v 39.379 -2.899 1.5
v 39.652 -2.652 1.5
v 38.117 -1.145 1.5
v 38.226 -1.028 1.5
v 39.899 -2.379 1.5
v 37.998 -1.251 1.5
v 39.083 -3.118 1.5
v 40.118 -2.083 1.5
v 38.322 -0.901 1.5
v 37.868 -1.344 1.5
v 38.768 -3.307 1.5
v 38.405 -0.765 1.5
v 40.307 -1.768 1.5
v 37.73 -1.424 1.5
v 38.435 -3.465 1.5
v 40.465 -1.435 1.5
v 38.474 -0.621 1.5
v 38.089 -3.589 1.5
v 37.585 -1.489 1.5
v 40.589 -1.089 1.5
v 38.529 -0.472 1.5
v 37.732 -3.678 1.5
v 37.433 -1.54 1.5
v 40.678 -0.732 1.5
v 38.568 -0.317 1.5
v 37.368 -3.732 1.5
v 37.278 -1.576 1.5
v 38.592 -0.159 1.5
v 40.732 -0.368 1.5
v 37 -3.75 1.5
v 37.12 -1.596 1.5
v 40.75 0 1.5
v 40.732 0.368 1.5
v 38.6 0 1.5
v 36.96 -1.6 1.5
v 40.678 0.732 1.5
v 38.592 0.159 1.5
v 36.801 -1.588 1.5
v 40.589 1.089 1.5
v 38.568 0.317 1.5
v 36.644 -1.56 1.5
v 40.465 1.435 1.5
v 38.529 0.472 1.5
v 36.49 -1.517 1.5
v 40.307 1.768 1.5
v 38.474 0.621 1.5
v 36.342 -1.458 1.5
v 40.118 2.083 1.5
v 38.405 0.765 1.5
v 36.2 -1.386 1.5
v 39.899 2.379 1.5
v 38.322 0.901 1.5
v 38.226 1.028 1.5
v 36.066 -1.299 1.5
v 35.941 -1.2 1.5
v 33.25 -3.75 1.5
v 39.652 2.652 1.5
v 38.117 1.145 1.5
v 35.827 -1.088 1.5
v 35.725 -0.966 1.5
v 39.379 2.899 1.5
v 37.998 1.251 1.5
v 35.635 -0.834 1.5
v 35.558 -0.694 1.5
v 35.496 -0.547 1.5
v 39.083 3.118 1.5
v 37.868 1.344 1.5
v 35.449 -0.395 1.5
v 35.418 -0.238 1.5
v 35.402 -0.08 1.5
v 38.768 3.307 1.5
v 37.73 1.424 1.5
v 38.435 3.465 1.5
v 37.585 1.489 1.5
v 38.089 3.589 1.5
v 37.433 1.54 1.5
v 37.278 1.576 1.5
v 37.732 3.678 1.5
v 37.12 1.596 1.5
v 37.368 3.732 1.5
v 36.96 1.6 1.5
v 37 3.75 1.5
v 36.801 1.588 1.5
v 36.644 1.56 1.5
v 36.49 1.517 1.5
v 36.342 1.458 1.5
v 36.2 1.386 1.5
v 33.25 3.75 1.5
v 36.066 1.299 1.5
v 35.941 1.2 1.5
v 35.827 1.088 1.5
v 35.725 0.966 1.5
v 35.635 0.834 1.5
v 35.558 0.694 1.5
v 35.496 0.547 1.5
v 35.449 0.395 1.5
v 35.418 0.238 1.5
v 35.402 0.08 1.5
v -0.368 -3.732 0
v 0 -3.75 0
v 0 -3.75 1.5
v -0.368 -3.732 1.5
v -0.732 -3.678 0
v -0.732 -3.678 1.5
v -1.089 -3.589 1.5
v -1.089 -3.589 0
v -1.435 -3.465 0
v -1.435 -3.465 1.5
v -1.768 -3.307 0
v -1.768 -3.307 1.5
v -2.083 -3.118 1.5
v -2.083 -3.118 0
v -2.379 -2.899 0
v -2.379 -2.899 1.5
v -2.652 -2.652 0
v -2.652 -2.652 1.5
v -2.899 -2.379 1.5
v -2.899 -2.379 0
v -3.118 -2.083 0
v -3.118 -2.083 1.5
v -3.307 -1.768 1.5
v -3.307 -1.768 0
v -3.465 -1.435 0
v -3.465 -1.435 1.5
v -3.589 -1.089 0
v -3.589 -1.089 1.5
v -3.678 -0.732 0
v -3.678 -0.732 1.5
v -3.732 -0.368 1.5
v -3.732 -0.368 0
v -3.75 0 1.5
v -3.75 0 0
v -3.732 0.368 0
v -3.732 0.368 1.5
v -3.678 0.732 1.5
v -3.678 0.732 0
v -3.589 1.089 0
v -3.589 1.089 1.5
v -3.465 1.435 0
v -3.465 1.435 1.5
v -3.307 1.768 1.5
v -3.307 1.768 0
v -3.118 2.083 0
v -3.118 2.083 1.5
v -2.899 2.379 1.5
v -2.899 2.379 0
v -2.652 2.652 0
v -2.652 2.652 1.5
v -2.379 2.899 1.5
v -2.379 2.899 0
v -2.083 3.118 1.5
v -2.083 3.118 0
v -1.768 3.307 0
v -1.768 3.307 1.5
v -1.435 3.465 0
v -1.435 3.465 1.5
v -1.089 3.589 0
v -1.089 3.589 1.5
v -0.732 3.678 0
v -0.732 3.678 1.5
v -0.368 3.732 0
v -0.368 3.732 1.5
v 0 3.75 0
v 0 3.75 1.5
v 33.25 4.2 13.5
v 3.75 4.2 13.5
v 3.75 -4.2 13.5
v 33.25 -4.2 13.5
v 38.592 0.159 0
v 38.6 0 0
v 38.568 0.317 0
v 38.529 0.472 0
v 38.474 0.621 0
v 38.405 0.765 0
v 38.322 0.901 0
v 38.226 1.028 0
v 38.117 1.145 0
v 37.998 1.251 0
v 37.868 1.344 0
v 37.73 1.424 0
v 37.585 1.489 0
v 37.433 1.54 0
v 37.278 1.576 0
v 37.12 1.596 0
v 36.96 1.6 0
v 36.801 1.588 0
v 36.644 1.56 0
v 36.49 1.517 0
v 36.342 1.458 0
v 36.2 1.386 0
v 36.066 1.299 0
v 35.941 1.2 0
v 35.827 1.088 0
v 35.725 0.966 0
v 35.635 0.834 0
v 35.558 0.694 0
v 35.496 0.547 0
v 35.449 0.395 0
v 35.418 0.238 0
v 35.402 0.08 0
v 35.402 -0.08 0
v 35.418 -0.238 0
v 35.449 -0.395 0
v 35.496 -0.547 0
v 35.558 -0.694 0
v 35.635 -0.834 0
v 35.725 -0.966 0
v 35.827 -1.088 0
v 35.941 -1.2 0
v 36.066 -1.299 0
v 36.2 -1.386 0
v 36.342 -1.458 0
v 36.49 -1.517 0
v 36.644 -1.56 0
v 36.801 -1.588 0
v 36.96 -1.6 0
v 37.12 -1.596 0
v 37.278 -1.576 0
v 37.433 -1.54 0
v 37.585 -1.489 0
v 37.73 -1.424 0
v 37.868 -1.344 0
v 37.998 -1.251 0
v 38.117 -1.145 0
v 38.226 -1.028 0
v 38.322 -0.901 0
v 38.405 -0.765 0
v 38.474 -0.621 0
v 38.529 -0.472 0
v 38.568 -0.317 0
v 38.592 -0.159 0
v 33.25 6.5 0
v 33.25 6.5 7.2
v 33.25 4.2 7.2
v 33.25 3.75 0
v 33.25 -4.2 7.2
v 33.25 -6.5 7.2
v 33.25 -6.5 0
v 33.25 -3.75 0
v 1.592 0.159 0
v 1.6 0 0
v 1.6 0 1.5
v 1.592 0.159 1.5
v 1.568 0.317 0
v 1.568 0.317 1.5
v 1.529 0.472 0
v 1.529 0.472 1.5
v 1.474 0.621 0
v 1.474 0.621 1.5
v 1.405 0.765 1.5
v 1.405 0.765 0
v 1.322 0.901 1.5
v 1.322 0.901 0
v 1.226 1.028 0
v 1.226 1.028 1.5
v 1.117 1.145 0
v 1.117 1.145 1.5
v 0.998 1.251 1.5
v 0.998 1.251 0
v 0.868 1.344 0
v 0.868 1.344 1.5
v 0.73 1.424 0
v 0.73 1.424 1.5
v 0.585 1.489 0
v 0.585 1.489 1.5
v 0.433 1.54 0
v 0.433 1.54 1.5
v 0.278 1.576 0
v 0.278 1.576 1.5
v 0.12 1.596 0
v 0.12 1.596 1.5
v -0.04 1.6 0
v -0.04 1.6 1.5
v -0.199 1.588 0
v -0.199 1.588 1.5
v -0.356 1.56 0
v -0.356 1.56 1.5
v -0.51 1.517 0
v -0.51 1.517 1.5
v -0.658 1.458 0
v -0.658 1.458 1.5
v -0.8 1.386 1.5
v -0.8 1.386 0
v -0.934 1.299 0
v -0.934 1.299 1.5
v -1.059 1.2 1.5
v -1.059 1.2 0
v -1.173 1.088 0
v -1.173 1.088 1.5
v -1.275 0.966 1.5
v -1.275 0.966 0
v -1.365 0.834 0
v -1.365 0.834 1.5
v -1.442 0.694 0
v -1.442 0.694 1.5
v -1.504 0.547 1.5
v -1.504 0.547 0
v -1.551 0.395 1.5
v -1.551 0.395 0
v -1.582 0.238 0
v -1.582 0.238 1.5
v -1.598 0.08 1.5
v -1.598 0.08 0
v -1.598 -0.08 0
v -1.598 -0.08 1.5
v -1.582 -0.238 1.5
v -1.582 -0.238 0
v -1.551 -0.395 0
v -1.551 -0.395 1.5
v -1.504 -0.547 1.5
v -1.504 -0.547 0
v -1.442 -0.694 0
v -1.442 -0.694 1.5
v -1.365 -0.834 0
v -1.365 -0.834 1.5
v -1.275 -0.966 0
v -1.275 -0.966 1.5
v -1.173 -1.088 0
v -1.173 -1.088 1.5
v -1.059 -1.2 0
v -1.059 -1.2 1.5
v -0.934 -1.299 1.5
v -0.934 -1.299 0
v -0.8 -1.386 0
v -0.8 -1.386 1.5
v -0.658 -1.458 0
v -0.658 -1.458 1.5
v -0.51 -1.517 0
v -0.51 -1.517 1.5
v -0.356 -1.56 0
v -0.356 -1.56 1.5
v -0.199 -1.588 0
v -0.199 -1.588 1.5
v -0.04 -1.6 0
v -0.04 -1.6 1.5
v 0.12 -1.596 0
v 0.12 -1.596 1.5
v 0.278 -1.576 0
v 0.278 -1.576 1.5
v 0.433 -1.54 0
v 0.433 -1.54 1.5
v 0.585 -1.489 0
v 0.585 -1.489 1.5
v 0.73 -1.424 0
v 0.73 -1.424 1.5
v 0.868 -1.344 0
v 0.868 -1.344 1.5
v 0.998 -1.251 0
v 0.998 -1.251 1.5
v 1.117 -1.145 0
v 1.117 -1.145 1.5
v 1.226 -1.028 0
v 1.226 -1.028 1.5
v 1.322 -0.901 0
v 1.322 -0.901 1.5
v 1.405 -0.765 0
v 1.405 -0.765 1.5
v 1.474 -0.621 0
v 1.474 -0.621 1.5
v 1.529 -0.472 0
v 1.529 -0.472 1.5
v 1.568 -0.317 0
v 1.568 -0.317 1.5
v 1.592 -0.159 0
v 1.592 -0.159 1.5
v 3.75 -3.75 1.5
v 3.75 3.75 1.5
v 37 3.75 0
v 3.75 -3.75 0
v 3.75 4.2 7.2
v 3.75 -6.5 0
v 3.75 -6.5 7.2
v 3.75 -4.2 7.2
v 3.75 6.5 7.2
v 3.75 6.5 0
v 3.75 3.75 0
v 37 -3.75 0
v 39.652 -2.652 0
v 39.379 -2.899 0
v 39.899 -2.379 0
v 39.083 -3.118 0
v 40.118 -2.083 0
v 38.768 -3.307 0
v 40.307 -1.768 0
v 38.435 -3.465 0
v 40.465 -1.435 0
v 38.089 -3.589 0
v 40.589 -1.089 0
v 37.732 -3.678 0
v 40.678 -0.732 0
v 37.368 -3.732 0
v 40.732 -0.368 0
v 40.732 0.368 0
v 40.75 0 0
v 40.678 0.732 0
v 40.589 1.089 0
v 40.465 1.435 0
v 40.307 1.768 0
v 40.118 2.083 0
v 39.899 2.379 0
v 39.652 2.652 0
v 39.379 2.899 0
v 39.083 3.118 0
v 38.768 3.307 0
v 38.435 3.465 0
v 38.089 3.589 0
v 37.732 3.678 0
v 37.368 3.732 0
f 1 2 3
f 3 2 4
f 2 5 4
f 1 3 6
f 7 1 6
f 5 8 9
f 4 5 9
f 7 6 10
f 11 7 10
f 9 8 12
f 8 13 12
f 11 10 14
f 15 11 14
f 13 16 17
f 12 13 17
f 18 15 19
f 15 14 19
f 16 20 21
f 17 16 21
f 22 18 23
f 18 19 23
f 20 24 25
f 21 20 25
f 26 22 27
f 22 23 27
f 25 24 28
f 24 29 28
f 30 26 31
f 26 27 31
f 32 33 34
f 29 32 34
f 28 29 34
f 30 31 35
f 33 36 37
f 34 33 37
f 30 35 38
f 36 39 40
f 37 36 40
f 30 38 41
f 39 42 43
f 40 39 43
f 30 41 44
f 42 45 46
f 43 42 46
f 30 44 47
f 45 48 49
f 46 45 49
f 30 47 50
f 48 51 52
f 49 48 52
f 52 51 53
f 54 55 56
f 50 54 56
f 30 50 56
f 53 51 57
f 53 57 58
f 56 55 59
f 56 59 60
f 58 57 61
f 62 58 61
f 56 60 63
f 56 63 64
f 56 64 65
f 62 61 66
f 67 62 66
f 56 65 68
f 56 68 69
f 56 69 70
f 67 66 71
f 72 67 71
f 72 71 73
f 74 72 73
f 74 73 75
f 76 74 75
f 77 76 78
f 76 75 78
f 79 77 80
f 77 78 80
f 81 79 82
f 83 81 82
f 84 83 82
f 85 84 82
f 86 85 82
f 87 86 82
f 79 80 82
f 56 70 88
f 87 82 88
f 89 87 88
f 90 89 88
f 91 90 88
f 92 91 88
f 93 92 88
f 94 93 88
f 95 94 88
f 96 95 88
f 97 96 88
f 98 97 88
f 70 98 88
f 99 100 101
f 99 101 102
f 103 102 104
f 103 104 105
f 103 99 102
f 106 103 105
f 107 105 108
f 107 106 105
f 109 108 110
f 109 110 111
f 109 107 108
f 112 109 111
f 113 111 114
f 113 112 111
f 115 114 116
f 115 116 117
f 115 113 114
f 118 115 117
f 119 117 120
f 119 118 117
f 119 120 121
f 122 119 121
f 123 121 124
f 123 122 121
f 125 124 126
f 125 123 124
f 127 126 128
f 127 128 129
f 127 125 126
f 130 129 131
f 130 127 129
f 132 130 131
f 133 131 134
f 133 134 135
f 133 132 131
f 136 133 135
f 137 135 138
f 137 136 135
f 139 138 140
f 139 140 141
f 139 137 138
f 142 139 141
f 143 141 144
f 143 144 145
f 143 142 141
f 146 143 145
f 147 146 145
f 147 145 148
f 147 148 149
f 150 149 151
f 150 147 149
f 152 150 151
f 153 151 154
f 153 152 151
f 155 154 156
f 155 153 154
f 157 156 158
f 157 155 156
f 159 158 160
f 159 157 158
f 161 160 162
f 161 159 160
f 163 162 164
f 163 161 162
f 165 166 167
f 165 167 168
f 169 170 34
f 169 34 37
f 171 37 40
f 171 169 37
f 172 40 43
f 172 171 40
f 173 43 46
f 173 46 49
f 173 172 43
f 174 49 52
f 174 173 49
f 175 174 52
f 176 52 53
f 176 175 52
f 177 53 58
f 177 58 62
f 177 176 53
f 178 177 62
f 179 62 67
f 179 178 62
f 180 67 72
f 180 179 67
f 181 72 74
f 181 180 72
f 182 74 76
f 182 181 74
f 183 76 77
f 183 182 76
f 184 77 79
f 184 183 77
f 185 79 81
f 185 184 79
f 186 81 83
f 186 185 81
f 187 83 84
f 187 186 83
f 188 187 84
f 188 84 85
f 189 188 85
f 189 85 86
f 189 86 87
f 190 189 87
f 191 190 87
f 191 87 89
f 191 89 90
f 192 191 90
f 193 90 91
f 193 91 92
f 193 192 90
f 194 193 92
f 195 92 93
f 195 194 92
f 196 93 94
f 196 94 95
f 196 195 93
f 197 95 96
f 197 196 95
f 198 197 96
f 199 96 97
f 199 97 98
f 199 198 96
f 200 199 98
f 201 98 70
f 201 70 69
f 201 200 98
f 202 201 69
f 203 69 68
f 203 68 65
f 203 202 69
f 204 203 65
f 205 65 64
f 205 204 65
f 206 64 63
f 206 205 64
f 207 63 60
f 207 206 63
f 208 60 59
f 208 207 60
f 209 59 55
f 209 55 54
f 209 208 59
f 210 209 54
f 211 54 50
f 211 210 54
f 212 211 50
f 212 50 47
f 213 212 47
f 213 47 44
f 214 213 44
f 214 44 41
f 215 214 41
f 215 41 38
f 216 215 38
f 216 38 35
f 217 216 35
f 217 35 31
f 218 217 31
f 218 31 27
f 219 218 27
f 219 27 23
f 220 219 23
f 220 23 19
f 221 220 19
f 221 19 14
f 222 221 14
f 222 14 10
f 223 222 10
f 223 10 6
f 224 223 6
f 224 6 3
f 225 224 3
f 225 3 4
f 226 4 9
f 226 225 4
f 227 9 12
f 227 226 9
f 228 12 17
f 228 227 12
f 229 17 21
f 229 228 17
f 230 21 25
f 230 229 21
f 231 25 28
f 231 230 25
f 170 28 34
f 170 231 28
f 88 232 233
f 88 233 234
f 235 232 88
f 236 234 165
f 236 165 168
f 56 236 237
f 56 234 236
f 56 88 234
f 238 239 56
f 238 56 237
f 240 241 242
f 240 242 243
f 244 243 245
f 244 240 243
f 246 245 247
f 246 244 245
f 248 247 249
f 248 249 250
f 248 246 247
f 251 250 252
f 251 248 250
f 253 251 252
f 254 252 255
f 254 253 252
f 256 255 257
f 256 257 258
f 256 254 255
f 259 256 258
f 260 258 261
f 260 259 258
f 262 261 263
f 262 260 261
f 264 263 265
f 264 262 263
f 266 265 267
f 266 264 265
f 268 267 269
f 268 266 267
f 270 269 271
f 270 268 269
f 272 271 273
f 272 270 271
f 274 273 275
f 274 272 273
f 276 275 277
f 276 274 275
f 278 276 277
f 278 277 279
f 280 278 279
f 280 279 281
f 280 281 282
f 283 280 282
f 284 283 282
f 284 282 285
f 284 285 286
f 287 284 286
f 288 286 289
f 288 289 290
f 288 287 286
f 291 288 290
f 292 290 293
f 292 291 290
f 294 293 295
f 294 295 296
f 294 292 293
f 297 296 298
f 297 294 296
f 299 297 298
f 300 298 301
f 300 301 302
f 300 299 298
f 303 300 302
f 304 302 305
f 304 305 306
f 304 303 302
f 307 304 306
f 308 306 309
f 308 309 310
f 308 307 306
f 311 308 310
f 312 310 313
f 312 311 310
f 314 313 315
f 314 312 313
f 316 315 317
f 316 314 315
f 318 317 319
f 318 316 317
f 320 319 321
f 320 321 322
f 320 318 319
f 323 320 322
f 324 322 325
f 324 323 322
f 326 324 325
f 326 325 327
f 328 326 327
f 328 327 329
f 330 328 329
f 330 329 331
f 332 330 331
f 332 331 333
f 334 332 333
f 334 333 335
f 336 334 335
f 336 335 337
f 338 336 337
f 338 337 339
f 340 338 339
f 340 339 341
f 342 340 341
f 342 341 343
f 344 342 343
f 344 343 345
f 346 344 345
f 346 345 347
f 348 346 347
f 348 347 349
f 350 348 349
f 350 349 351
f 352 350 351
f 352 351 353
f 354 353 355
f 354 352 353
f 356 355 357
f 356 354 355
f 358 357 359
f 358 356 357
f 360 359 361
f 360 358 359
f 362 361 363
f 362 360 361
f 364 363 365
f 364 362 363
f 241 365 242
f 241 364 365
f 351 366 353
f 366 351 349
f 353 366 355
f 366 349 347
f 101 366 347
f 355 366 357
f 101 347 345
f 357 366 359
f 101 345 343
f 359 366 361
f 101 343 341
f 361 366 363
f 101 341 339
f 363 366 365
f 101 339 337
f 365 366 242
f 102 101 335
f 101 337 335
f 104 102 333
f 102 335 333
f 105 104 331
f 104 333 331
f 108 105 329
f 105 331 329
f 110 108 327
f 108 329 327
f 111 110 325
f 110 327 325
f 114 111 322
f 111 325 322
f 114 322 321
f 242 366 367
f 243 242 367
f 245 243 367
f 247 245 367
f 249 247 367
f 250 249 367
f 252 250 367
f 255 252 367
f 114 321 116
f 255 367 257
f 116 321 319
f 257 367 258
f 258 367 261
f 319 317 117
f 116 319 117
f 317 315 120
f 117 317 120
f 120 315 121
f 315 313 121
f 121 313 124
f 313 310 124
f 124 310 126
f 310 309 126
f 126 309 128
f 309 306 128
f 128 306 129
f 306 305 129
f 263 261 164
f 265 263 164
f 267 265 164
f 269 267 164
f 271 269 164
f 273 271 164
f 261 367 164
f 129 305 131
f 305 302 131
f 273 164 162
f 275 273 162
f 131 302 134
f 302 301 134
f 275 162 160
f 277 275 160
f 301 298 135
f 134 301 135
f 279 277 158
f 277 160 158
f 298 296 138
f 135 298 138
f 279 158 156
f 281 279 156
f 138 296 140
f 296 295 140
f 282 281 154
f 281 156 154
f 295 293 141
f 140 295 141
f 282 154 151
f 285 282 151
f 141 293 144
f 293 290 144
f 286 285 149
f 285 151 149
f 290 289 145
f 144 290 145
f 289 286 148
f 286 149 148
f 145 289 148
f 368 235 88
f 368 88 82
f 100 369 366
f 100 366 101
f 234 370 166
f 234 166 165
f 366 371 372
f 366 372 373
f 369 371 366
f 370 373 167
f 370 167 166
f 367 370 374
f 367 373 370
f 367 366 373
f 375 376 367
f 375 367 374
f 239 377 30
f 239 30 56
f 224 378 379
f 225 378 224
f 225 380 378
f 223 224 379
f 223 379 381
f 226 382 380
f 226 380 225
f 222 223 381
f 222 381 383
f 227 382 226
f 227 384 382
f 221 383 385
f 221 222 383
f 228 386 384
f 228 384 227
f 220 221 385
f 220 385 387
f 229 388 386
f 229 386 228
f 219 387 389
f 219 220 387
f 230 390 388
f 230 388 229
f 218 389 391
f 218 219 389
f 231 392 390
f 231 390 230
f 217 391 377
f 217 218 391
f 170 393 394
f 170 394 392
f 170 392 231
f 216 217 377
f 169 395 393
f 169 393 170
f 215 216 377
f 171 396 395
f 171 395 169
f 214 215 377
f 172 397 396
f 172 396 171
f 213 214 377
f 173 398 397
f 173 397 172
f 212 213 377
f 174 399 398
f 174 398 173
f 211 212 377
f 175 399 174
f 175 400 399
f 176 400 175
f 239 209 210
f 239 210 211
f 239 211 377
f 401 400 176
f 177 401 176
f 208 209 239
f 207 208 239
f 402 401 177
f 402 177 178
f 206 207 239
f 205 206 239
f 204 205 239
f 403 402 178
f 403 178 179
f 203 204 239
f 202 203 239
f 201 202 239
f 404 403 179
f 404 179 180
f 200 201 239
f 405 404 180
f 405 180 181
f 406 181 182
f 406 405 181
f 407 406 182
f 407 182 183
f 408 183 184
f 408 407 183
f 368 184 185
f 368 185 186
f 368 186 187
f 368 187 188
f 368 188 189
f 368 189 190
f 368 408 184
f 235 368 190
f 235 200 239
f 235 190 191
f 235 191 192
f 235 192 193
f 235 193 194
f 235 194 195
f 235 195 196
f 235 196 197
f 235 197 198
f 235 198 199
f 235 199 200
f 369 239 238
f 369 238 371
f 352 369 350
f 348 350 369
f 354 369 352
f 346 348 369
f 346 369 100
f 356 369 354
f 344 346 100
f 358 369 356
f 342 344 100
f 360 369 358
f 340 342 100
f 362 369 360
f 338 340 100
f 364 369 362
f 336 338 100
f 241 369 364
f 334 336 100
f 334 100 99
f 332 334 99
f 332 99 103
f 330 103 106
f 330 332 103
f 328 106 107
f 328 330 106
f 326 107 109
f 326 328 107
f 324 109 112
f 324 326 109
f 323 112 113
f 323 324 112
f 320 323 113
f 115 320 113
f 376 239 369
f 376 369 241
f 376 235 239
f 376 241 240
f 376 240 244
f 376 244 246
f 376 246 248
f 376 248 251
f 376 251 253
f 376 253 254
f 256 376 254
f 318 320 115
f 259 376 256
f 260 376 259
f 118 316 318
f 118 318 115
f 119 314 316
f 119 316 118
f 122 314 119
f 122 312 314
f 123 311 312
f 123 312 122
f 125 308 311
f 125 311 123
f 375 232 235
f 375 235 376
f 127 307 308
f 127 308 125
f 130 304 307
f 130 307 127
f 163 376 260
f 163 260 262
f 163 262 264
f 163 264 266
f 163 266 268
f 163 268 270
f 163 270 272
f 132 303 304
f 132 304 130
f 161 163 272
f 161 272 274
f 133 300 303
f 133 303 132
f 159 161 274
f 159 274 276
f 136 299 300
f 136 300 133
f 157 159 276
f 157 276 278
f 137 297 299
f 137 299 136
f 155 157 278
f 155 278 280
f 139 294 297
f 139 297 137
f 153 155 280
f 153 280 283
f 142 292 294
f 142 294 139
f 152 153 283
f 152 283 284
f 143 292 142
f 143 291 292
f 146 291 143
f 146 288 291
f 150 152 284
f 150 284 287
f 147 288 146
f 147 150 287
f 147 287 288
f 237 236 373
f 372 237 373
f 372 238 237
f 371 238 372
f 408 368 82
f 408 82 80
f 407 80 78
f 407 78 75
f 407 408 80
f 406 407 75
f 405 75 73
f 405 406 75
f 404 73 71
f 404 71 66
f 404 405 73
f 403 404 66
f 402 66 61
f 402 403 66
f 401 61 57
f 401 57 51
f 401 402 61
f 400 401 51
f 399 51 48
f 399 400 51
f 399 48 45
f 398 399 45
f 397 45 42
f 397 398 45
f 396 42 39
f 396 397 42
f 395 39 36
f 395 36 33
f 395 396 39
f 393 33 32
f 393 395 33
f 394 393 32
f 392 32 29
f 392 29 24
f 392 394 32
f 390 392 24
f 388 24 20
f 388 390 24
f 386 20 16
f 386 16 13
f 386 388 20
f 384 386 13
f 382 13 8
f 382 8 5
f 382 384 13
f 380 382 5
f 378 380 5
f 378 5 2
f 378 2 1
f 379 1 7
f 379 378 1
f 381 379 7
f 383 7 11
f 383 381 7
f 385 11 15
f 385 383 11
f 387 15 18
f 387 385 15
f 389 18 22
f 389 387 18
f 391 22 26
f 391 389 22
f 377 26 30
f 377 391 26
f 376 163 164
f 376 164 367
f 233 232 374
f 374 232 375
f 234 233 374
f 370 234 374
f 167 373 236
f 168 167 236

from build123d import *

# Parameters (mm, degrees)
SKETCH_1_R      = 1.6
EXTRUDE_1_DEPTH = 1.5
SKETCH_2_W      = 29.5
SKETCH_2_H      = 3.75
SKETCH_2_H_2    = 2.75
EXTRUDE_2_DEPTH = 7.2
SKETCH_3_W      = 29.5
SKETCH_3_H      = 8.4
EXTRUDE_3_DEPTH = 6.3


with BuildPart() as part:
    # ｽｹｯﾁ1 → ﾎﾞｽ - 押し出し1 (new body)
    with BuildSketch(Plane.XY):
        with BuildLine():
            Line((0, 3.75), (37, 3.75))
            ThreePointArc((37, 3.75), (40.75, 0), (37, -3.75))
            Line((37, -3.75), (0, -3.75))
            ThreePointArc((0, -3.75), (-3.75, 0), (0, 3.75))
        make_face()
        Circle(SKETCH_1_R, mode=Mode.SUBTRACT)
        with Locations((37, 0)):
            Circle(SKETCH_1_R, mode=Mode.SUBTRACT)
    extrude(amount=EXTRUDE_1_DEPTH)

    # ｽｹｯﾁ2 → ﾎﾞｽ - 押し出し2 (add)
    with BuildSketch(Plane(origin=(0, 0, 0), x_dir=(-1, 0, 0), z_dir=(0, 0, -1))):
        with Locations((-18.5, -1.875)):
            Rectangle(SKETCH_2_W, SKETCH_2_H)
        with Locations((-18.5, 1.875)):
            Rectangle(SKETCH_2_W, SKETCH_2_H)
        with Locations((-18.5, 5.125)):
            Rectangle(SKETCH_2_W, SKETCH_2_H_2)
        with Locations((-18.5, -5.125)):
            Rectangle(SKETCH_2_W, SKETCH_2_H_2)
    extrude(amount=-EXTRUDE_2_DEPTH)

    # ｽｹｯﾁ3 → ﾎﾞｽ - 押し出し3 (add)
    with BuildSketch(Plane.XY.offset(7.2)):
        with Locations((18.5, 0)):
            Rectangle(SKETCH_3_W, SKETCH_3_H)
    extrude(amount=EXTRUDE_3_DEPTH)


solid = part.part
